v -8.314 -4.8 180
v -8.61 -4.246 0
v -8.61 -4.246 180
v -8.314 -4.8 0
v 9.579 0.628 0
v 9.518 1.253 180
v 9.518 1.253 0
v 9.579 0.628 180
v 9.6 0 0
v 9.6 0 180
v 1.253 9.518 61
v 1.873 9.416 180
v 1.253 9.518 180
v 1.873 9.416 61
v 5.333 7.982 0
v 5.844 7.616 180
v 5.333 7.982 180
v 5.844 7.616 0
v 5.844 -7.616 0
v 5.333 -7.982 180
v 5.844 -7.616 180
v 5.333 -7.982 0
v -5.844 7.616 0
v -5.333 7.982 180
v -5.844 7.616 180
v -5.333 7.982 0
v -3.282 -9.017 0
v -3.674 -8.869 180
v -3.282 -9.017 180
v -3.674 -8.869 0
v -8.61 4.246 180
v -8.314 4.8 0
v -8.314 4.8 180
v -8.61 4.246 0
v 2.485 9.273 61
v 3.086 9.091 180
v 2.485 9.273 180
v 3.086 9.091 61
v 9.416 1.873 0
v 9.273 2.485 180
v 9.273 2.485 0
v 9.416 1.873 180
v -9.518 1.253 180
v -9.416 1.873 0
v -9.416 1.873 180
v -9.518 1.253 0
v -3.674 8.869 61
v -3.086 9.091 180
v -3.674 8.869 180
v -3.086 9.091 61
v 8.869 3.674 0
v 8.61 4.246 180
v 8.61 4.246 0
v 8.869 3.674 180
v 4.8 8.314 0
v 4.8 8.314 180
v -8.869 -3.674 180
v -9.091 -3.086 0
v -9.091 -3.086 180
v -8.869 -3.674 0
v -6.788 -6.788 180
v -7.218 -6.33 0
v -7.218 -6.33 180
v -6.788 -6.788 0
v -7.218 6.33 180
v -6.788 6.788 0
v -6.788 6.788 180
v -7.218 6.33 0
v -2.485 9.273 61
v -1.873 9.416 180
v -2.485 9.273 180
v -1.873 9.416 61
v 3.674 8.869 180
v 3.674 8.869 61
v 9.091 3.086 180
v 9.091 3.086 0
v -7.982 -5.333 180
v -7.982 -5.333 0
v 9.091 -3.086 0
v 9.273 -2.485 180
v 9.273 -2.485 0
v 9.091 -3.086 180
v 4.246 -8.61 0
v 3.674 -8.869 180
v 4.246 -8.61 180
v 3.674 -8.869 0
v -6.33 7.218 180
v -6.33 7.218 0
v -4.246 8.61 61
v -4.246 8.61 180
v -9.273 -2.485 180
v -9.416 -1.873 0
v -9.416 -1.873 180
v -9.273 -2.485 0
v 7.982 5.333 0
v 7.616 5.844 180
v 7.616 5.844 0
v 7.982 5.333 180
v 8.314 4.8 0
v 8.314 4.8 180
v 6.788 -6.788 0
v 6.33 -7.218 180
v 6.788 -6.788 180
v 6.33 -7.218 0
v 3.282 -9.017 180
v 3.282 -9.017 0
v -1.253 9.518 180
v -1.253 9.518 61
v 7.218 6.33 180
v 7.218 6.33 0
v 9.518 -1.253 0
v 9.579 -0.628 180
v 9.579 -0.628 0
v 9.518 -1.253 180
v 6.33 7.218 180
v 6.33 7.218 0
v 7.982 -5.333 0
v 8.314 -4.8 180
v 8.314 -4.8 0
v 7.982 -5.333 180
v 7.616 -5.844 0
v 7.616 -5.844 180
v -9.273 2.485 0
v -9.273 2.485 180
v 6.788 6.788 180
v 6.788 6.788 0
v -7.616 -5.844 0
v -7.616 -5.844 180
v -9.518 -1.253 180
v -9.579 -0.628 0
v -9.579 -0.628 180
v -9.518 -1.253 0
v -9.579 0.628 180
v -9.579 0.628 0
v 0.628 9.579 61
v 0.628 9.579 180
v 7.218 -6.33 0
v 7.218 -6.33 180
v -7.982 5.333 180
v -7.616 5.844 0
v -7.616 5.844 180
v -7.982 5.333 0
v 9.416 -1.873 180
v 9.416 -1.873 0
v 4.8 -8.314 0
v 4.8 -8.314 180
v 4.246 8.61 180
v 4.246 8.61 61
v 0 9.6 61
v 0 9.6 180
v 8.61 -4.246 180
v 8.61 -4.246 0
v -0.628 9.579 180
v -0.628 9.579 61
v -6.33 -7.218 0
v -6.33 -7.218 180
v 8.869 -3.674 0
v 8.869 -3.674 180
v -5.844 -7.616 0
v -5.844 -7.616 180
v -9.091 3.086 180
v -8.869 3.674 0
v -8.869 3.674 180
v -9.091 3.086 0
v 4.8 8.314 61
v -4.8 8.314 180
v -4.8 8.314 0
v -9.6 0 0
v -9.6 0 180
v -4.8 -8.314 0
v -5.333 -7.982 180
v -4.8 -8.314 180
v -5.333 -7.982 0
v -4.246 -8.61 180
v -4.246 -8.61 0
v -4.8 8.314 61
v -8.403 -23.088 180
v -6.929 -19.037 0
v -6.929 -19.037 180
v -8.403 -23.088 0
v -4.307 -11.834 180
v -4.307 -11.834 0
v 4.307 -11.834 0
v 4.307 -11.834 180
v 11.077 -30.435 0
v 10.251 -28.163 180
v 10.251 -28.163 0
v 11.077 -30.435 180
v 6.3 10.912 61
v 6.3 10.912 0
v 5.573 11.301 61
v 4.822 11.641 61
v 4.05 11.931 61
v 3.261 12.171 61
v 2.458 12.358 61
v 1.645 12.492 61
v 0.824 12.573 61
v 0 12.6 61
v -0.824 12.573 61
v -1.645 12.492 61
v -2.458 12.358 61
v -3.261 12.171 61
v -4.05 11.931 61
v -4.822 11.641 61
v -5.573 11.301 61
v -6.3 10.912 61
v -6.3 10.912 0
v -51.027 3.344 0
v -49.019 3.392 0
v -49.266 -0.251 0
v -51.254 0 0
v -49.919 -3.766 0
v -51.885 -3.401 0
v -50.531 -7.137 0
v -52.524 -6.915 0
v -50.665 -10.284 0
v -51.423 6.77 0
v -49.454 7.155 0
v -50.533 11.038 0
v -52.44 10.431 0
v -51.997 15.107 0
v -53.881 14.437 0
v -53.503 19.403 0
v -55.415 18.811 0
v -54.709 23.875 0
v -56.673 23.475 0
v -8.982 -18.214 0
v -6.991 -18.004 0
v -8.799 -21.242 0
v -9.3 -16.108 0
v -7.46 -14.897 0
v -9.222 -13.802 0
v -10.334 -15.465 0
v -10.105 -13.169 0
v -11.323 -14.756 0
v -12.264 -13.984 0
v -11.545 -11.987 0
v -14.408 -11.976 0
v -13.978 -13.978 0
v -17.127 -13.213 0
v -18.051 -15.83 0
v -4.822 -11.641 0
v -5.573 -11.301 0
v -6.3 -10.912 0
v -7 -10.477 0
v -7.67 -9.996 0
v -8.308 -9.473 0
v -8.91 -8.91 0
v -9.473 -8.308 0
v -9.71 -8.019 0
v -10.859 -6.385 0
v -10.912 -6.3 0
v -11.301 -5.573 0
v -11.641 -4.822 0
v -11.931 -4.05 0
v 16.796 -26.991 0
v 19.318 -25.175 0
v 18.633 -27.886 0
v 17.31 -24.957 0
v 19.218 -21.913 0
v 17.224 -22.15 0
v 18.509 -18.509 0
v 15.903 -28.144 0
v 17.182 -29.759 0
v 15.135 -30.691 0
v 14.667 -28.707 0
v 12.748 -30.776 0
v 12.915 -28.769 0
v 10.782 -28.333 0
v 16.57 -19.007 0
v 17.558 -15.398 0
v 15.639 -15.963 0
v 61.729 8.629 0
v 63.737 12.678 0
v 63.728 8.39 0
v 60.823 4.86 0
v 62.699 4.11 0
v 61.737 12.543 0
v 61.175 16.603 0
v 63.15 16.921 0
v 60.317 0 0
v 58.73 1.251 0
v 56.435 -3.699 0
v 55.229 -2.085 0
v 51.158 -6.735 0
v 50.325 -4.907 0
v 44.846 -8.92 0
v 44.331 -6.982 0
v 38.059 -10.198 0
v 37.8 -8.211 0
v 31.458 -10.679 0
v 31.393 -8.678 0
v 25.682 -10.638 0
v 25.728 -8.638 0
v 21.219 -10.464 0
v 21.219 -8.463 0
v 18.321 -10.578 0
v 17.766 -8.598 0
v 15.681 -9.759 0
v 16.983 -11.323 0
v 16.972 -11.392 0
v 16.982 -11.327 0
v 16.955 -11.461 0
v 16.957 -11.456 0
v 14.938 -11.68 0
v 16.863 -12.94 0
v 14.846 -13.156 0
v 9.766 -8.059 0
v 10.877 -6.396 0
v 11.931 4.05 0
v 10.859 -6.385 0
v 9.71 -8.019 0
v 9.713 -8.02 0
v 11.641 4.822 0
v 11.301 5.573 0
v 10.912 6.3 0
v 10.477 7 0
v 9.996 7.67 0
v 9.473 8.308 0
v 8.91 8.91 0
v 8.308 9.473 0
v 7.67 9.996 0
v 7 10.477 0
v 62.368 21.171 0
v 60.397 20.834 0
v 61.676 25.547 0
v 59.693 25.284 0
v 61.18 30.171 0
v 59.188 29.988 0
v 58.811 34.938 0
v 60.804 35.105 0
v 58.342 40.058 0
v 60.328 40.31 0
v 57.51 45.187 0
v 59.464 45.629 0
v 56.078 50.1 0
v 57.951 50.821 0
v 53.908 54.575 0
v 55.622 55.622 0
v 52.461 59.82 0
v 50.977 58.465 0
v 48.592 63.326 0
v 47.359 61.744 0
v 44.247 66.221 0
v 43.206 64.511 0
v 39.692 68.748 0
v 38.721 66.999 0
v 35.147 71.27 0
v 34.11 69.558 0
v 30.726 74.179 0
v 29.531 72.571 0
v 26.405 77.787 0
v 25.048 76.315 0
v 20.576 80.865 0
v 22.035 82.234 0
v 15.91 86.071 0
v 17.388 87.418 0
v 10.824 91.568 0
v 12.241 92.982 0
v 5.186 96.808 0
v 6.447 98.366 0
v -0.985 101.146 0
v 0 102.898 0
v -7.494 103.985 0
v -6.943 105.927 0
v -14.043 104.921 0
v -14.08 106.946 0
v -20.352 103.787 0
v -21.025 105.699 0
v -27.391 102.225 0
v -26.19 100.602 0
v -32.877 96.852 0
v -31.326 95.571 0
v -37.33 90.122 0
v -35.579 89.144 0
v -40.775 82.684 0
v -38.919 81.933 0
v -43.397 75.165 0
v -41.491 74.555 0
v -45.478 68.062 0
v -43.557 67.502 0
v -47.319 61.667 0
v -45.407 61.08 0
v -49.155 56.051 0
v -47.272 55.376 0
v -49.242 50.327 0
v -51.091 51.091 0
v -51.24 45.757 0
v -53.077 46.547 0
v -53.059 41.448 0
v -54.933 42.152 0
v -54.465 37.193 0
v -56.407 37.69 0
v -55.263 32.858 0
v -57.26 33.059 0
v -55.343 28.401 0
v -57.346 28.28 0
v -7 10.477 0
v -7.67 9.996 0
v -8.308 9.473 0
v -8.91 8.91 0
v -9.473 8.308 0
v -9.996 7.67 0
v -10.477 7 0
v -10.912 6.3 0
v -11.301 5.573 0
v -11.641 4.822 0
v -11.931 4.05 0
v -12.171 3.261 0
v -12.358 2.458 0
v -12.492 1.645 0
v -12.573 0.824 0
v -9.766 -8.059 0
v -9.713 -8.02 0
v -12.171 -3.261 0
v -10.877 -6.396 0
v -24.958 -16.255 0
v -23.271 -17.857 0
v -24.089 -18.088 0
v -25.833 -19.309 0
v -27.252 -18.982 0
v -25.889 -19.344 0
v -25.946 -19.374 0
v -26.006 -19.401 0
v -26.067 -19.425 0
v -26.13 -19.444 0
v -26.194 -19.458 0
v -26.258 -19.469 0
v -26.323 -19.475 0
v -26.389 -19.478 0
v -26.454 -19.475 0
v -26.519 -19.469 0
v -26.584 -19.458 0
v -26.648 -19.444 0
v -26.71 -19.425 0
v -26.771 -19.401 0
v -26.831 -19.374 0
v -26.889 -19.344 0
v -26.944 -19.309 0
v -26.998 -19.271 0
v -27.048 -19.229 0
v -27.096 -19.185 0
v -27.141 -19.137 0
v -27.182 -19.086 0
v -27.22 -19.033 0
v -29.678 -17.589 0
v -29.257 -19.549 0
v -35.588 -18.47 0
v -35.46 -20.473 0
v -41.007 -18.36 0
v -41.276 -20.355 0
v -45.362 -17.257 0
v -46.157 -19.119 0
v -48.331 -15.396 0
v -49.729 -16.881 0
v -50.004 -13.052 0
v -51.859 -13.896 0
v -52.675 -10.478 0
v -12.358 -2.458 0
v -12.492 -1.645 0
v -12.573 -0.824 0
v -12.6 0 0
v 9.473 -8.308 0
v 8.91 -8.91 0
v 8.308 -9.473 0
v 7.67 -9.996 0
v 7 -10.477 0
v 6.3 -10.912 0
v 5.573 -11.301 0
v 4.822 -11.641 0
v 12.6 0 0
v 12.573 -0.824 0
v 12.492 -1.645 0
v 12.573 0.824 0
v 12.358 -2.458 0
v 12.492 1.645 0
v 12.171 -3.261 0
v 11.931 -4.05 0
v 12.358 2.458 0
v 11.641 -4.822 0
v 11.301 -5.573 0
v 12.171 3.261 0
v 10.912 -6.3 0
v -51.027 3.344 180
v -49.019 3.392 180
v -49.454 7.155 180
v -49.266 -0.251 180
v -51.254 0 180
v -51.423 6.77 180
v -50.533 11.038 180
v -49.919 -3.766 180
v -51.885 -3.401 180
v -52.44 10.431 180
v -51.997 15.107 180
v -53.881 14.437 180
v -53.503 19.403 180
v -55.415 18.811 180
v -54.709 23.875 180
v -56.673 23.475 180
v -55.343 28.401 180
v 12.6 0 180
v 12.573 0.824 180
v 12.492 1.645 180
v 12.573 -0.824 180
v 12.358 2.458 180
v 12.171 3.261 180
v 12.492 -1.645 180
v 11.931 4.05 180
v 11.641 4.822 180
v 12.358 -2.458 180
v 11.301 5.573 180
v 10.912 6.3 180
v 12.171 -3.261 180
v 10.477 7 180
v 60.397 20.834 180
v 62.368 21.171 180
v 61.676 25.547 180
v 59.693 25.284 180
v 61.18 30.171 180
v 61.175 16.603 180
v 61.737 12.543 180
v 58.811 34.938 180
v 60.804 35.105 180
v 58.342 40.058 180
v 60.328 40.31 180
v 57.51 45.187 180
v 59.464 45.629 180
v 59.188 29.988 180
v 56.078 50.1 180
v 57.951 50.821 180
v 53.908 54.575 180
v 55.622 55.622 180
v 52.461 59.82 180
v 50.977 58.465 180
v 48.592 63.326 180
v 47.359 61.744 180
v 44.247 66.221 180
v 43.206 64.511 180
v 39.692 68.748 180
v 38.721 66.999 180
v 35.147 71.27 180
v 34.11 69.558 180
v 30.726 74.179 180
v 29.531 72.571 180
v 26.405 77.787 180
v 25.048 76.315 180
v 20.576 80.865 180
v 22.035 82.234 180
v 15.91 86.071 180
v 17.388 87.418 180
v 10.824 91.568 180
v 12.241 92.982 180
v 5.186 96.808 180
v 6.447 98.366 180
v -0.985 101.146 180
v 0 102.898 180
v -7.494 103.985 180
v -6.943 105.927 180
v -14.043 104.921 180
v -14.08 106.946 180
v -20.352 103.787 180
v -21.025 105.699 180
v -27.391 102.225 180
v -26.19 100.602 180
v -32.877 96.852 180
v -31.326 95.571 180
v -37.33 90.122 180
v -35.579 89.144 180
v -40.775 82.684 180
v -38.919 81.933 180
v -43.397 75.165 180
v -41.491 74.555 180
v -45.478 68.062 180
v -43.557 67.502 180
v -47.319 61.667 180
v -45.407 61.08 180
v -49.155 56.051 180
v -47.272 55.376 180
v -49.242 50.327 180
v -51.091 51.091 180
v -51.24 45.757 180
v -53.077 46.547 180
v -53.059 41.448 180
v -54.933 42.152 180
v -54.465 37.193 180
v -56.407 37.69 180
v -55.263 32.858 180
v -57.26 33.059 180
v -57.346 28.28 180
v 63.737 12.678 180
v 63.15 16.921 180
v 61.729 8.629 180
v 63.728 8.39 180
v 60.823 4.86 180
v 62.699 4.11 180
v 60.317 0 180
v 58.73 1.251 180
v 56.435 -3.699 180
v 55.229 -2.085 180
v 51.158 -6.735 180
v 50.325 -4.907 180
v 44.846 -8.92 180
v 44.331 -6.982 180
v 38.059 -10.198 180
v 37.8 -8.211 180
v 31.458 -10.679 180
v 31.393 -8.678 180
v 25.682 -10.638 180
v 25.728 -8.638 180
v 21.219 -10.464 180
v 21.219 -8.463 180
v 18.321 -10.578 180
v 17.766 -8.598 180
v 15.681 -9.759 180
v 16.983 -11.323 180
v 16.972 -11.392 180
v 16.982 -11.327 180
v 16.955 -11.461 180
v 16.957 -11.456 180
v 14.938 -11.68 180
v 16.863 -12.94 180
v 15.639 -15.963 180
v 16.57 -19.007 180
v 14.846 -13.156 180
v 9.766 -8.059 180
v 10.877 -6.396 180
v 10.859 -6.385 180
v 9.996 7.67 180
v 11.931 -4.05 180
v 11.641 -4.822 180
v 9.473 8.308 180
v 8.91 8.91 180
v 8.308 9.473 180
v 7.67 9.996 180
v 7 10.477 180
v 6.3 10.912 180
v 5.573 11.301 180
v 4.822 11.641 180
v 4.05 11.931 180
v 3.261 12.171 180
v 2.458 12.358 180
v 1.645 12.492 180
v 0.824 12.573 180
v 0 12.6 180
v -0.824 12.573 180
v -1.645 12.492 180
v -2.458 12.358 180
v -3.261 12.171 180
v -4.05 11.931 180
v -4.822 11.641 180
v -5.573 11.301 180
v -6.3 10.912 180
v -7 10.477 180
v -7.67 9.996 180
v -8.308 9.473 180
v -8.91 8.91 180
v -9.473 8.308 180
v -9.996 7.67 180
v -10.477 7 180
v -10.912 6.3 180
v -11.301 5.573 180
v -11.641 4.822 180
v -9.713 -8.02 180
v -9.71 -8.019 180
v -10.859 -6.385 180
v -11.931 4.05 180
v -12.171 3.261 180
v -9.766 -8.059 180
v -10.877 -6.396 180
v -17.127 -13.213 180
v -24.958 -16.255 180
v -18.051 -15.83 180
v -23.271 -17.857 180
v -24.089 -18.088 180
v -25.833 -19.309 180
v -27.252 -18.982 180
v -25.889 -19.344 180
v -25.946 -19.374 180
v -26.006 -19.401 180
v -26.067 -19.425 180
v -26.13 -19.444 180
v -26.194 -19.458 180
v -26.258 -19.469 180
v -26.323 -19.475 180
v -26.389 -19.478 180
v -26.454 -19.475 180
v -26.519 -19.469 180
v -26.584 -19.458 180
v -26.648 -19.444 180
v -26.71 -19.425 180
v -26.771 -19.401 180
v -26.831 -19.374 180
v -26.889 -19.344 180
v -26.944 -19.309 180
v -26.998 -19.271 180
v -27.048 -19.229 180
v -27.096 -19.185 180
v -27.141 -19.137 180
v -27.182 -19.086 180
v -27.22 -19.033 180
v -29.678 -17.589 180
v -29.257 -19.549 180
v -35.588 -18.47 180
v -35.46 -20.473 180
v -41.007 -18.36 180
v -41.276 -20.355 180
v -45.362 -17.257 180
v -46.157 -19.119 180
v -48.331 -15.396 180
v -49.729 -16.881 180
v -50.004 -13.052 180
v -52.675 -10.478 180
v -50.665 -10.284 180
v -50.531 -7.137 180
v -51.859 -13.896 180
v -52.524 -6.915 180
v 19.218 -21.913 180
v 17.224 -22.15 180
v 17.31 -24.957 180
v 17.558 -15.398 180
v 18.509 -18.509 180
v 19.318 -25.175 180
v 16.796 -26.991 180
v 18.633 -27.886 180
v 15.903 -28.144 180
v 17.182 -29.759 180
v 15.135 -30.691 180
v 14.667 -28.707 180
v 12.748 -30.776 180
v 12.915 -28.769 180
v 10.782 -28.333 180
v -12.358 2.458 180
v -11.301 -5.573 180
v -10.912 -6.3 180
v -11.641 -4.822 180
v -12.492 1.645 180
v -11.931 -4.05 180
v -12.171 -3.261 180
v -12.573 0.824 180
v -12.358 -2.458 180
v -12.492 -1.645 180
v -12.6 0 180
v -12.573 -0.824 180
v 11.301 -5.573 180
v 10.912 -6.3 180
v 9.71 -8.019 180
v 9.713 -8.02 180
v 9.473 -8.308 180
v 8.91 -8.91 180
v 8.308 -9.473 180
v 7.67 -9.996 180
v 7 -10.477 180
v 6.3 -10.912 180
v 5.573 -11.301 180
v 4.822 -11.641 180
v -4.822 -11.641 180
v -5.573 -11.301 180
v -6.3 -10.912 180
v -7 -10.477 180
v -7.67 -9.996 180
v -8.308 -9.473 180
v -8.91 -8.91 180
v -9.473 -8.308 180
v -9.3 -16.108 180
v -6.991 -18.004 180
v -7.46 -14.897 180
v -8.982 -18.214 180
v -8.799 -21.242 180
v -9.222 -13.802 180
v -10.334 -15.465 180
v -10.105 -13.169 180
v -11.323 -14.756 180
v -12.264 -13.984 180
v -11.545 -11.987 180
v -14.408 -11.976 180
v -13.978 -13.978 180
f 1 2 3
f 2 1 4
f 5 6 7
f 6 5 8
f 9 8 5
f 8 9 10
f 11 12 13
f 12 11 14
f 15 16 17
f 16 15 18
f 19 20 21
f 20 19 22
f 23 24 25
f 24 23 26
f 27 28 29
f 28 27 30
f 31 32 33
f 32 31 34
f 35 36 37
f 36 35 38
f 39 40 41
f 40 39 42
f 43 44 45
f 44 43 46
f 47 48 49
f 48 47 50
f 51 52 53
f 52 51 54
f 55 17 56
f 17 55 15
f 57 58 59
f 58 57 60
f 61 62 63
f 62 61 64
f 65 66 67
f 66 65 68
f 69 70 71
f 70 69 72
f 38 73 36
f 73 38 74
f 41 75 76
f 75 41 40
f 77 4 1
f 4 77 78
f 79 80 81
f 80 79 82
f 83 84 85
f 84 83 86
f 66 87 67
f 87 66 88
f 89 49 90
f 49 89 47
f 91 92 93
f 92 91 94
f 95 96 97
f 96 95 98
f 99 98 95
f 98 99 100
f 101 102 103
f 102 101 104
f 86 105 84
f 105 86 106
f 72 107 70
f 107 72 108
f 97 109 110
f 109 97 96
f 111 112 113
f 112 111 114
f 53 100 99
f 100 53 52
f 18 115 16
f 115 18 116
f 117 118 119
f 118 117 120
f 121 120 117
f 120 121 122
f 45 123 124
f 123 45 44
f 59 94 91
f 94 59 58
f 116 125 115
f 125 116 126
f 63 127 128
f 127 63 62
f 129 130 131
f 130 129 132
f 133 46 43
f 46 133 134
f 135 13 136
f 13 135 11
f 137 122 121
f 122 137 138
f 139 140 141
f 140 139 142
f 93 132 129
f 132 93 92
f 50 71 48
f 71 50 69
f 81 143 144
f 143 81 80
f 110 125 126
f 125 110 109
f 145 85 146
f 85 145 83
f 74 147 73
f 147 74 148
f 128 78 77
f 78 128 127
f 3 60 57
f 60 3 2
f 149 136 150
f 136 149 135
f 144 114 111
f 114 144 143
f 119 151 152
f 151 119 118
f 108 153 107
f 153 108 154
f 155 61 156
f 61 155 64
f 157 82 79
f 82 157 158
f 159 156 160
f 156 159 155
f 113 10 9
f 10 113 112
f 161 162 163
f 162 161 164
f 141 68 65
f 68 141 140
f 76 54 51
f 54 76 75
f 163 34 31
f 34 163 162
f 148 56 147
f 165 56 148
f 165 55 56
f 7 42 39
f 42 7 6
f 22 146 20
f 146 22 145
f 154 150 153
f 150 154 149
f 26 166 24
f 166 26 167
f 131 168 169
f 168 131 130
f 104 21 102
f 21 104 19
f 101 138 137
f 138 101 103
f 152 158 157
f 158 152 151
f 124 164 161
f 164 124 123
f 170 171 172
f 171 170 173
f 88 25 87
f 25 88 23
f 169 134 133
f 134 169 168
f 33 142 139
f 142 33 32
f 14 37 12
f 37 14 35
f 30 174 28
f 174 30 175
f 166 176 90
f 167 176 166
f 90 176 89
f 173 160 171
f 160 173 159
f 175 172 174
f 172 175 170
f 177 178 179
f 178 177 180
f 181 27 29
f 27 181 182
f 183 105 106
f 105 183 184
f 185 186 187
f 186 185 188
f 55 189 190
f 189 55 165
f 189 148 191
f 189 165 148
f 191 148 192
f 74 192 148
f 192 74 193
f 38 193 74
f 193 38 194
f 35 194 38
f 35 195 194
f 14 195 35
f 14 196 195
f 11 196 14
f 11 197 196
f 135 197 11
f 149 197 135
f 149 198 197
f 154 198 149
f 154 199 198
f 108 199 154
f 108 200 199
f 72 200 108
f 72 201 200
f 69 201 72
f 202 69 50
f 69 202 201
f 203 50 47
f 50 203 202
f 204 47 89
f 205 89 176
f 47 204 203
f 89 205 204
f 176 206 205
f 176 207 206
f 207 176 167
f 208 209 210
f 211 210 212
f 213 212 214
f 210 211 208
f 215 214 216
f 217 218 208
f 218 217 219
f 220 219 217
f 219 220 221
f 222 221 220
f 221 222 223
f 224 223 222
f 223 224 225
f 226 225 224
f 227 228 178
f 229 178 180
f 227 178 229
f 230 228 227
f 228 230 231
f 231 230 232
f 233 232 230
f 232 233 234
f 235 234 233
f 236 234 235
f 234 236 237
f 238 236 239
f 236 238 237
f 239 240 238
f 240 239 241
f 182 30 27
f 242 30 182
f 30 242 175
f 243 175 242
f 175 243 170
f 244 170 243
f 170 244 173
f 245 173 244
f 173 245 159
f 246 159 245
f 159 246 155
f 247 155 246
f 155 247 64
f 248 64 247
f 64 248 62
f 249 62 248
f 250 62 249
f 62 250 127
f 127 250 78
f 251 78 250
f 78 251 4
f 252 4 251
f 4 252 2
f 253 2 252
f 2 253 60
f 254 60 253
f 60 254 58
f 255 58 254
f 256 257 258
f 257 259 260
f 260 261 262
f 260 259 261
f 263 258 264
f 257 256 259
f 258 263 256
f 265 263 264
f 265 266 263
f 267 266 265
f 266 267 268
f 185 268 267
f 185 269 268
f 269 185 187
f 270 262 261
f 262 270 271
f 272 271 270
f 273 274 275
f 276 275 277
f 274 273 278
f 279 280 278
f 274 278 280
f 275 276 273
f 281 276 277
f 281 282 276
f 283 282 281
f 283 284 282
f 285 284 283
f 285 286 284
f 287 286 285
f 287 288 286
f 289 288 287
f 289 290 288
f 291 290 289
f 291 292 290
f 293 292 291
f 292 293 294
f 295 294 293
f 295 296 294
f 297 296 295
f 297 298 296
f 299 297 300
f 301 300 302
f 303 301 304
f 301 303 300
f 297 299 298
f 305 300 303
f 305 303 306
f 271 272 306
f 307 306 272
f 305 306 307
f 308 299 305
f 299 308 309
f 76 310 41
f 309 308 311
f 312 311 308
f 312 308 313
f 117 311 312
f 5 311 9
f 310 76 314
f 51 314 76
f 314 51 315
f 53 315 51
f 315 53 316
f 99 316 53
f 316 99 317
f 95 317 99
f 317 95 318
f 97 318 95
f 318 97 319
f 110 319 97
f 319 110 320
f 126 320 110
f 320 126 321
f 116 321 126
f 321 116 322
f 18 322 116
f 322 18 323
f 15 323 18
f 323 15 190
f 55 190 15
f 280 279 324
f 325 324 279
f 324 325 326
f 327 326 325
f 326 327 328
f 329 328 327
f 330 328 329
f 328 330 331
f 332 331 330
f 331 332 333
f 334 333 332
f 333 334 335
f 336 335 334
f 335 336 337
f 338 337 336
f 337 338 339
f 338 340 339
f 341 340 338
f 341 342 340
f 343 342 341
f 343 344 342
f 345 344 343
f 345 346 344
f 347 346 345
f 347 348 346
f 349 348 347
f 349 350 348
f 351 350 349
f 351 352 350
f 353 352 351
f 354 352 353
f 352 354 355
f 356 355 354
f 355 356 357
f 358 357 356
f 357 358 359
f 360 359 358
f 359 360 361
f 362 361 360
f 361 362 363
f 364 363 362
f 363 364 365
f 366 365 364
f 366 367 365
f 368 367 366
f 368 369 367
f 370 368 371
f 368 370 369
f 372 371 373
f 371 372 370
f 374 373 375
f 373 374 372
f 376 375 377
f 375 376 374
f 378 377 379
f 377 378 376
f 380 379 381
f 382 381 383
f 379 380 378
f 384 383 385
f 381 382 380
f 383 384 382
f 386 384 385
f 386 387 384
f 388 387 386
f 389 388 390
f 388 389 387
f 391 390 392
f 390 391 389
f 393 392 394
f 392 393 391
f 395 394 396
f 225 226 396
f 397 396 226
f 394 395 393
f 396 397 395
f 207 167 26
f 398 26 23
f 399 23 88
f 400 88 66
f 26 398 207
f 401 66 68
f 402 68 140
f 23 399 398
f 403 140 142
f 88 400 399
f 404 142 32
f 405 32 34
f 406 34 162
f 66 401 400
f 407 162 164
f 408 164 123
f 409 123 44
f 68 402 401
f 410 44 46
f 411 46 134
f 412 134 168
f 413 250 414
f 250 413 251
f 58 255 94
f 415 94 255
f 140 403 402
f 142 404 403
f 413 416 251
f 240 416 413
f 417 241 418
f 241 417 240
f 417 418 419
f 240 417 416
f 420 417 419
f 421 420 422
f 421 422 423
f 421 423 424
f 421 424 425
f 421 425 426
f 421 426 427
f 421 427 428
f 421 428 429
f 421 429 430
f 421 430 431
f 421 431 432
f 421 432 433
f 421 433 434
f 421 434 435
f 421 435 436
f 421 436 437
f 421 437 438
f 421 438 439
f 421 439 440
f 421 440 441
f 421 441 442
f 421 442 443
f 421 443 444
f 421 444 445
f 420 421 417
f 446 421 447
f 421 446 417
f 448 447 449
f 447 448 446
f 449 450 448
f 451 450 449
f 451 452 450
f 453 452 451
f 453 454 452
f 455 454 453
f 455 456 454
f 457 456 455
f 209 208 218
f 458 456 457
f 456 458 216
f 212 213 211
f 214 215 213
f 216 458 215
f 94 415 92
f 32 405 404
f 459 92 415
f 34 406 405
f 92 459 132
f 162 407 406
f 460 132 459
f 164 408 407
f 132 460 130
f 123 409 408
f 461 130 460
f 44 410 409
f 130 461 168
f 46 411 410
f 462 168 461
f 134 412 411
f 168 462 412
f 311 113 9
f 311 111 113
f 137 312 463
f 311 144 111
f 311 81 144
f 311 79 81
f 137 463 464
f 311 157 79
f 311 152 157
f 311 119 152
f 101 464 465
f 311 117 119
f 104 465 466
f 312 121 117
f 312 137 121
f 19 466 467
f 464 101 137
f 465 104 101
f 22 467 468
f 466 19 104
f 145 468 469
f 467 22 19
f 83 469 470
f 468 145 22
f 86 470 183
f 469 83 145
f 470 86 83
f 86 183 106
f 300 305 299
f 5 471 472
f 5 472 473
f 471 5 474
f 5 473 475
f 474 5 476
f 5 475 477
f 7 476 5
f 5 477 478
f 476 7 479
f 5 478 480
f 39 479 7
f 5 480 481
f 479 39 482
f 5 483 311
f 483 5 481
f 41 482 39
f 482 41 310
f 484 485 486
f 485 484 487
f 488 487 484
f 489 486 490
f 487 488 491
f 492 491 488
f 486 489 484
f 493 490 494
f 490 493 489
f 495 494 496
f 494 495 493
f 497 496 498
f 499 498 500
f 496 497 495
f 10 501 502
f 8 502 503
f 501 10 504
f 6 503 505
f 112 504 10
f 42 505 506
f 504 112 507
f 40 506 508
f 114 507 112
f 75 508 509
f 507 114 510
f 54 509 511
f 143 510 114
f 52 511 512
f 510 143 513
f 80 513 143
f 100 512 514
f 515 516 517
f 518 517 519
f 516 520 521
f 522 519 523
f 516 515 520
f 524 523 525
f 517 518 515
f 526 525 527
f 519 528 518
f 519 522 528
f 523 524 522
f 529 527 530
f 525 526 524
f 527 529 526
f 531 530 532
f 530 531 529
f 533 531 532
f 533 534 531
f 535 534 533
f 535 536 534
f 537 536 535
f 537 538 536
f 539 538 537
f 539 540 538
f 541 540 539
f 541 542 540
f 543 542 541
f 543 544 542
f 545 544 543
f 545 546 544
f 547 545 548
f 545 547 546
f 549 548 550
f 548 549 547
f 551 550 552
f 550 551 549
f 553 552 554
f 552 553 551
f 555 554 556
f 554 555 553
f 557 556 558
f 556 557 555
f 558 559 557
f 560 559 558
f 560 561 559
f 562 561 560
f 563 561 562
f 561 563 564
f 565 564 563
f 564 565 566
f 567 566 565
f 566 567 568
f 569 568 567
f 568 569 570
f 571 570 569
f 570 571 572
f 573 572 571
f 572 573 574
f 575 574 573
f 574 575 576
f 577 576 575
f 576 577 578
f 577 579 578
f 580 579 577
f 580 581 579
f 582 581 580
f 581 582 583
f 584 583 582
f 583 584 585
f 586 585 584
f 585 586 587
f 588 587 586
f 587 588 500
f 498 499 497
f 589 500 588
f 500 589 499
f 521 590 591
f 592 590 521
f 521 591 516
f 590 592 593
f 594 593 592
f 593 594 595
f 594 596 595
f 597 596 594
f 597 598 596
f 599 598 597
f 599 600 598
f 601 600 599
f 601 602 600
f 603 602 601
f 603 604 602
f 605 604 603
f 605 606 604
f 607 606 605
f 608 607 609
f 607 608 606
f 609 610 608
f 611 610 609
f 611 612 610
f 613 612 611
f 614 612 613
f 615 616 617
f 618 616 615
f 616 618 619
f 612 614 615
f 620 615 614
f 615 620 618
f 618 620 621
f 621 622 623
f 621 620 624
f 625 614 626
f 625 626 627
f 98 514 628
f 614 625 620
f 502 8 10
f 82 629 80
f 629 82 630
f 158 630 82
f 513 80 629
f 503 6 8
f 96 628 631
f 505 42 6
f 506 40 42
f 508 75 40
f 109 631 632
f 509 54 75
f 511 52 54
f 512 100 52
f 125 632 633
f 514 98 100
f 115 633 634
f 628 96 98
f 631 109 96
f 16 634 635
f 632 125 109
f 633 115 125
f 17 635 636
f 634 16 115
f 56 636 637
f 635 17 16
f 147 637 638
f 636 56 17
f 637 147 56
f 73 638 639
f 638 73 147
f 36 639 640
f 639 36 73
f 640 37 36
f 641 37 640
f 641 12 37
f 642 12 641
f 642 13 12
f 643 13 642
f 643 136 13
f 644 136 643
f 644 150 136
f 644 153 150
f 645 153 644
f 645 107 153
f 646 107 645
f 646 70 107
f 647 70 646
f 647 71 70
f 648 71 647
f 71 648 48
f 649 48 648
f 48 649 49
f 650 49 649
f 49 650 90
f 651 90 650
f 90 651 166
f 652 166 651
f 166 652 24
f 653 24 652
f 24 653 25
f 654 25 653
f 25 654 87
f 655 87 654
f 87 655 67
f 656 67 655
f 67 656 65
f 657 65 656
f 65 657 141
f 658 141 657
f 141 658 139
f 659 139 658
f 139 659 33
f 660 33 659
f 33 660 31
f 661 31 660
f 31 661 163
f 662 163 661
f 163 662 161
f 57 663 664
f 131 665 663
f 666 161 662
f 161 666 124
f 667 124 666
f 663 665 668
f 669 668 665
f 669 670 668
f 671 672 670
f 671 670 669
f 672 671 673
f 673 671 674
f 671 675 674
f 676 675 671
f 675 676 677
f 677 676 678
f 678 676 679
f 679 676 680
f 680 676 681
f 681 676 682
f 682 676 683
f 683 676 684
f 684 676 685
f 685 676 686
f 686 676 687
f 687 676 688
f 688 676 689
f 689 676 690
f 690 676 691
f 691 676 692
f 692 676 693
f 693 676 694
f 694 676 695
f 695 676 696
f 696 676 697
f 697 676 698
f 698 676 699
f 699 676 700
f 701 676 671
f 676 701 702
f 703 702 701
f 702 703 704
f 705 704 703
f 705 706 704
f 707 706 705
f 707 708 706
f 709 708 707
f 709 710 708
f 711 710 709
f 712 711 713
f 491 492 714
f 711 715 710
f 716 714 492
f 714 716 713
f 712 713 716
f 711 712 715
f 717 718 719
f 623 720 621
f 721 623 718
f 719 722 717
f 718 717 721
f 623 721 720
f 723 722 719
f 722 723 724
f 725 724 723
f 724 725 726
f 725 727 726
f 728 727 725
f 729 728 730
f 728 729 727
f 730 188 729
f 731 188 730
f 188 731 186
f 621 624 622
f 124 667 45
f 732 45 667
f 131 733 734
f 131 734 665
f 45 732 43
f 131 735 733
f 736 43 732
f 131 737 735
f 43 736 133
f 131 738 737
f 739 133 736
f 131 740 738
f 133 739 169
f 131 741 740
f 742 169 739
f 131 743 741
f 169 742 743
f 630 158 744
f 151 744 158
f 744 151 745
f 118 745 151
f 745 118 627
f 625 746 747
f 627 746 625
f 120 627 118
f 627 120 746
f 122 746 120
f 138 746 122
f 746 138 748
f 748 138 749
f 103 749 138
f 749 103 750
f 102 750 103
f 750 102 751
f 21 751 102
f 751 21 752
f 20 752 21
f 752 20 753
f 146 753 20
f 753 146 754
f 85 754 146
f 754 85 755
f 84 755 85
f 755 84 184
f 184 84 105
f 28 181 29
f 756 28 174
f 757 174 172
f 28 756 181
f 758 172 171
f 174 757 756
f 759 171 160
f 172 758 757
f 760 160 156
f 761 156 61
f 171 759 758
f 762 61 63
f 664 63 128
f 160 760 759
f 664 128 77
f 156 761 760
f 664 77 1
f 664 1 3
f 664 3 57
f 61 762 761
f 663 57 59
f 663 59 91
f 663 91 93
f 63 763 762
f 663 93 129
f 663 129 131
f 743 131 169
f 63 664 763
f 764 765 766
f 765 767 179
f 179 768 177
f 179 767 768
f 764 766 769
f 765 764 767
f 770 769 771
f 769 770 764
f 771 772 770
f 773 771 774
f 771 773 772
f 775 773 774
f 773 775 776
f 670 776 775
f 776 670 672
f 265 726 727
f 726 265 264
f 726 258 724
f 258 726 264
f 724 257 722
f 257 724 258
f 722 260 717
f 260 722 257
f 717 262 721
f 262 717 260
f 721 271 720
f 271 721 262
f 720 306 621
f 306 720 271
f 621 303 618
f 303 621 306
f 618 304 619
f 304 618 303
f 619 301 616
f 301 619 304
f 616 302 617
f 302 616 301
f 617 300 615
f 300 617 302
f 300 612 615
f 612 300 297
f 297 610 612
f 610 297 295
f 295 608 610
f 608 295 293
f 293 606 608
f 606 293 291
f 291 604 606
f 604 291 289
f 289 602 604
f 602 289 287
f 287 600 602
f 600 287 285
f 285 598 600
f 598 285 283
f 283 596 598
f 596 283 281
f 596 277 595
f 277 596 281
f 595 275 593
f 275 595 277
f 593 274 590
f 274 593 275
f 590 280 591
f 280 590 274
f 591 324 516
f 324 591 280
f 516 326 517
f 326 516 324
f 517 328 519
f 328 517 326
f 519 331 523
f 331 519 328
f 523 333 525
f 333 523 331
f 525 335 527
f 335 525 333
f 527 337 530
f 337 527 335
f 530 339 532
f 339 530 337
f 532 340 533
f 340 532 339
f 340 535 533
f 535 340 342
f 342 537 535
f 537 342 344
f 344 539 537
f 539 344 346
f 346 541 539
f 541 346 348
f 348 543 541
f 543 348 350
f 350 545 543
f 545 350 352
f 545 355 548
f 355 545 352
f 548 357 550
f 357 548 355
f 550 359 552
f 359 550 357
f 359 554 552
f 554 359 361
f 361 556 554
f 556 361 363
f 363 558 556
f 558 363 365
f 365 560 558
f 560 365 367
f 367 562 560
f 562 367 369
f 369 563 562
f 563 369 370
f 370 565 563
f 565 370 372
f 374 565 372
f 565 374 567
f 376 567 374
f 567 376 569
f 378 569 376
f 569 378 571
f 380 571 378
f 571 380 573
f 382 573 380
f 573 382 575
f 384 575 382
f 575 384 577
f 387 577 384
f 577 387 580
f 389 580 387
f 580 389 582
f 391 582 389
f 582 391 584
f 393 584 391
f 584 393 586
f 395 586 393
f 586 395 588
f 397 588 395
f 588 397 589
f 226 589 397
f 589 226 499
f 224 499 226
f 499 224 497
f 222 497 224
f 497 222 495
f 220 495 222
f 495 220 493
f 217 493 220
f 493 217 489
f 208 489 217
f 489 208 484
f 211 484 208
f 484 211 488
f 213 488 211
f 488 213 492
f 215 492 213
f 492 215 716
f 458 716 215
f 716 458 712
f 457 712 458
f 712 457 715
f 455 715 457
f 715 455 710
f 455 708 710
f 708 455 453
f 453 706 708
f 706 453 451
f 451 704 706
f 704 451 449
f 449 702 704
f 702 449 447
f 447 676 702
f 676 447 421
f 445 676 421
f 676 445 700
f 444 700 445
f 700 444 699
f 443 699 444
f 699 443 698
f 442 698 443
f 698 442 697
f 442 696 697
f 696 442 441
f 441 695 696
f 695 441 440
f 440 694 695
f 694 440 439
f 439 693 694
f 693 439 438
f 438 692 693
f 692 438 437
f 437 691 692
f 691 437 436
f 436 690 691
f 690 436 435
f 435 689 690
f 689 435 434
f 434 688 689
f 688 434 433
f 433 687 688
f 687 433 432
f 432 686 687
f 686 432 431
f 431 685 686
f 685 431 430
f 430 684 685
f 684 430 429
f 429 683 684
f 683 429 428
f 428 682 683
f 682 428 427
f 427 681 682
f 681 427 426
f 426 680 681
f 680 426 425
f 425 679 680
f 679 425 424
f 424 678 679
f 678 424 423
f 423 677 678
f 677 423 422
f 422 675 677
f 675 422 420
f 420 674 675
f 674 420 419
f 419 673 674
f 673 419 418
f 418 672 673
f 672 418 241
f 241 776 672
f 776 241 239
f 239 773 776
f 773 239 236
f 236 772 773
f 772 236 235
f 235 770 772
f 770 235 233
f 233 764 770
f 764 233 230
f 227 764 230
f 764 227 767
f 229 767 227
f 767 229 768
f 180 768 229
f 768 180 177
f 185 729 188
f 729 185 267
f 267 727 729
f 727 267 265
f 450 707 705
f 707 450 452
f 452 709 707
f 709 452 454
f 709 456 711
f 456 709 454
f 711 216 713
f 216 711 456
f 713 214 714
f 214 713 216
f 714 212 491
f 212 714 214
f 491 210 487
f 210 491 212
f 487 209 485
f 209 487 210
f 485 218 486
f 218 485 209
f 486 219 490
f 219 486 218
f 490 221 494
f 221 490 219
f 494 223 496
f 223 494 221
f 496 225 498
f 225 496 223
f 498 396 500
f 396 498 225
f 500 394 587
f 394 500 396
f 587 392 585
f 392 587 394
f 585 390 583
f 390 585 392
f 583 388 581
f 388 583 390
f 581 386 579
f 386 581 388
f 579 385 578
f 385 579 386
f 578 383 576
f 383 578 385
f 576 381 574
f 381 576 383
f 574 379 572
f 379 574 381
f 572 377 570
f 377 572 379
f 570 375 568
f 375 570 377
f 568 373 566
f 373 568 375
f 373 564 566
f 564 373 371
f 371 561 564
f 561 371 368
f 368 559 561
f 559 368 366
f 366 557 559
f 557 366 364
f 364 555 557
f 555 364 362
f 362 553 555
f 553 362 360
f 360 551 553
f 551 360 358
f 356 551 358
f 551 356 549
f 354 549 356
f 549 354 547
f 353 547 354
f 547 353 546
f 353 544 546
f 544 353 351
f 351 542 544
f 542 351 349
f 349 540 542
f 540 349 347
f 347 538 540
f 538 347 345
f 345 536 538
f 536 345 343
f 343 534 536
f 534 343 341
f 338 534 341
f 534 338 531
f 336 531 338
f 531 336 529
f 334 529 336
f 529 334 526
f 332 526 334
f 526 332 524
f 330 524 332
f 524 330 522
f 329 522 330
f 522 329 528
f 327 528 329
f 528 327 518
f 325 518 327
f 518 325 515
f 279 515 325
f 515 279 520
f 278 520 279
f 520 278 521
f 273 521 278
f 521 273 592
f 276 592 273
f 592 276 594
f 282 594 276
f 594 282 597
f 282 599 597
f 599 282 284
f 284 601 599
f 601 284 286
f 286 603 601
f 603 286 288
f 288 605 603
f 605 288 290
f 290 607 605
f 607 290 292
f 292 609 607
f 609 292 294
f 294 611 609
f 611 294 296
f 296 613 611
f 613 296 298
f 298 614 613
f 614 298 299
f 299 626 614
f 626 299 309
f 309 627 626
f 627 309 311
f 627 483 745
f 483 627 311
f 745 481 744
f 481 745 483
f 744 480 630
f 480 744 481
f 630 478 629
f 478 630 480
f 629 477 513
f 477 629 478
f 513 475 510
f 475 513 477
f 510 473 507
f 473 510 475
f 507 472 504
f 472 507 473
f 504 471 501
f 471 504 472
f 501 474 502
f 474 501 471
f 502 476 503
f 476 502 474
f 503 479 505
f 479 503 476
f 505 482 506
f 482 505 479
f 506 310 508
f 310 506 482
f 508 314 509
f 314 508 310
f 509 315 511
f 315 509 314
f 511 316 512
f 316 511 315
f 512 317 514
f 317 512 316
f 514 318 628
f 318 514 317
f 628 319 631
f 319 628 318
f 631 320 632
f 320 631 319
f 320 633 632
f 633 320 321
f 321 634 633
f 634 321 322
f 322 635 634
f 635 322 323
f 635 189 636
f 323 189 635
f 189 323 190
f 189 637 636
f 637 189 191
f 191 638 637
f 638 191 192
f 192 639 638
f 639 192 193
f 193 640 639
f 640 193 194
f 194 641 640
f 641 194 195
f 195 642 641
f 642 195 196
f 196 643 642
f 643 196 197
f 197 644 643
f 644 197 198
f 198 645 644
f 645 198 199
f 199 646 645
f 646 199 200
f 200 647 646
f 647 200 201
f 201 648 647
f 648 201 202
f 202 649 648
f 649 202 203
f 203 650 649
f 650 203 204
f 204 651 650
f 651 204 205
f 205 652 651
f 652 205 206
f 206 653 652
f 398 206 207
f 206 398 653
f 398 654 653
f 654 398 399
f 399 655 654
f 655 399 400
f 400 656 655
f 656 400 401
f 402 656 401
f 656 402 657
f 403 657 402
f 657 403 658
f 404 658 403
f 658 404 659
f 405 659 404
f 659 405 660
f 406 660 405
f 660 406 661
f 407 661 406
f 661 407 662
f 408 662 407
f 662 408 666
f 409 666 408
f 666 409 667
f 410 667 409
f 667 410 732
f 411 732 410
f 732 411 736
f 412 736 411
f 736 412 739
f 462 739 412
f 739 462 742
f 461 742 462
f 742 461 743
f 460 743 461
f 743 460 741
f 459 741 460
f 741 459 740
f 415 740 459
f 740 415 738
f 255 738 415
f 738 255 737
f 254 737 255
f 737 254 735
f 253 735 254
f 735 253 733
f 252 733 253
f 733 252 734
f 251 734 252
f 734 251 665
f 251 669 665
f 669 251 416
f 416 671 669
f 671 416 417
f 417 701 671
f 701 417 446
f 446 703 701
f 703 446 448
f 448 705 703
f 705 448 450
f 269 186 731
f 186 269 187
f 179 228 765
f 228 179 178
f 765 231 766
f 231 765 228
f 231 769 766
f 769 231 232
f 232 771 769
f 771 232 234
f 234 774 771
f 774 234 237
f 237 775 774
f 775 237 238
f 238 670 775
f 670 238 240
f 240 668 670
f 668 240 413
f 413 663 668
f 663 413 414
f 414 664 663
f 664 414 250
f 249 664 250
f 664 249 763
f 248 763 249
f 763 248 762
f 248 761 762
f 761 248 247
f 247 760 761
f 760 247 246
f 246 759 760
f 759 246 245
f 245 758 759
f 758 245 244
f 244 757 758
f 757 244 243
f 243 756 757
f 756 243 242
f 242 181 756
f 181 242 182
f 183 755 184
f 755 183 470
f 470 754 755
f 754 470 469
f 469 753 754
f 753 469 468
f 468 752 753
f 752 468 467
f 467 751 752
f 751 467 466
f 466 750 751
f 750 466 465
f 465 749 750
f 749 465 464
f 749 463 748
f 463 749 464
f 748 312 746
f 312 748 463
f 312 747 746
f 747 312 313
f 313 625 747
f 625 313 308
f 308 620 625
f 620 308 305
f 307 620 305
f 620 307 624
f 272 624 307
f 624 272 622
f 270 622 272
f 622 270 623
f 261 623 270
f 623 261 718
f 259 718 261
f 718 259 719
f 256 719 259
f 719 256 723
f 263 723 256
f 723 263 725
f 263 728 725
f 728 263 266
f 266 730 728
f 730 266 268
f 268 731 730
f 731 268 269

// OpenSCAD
// Lampenschirm für Stehlampe – organischer, wellenförmiger Querschnitt
// mit Klemmkragen, der in die Form integriert ist (keine D-Form mehr)
// Alle Maße in Millimetern (Regel: units-mm)
//
// Kontext: context/printer.md, context/tolerances.md und context/materials.md
// waren zum Zeitpunkt der Modellierung leer (siehe Regel: context-first).
// Annahmen aus dem Design-Dialog (siehe auch 001/002):
//   - Baubett >= 200mm Z-Höhe vorhanden -> Schirm wird als ein Teil,
//     stehend, in voller Höhe gedruckt.
//   - Klemmkragen als offener Federclip (C-Ring): Innendurchmesser 0.8mm
//     unter Stangendurchmesser (19.2mm ID auf 20mm Stange) für Vorspannung.
//   - E14-Fassung wird separat an der Stange montiert.
//
// Änderungen gegenüber 005 (Nutzer-Feedback: "Verbindung zwischen Klemme und
// Wand sieht wulstig/hässlich aus, soll dieselbe Wandstärke wie sonst haben"):
//   - Der massive Verbindungskeil (boss_bridge_2d, voller Sektor von 140°) ist
//     ersetzt durch zwei schlanke Stege (bridge_ribs_2d), jeweils exakt
//     wall_t (2mm) dick - gebaut über hull() von zwei Kreisen (Kapsel-Technik),
//     dadurch garantiert konstante Wandstärke unabhängig von der Wellenform.
//   - Die Stege sitzen bei ±55° neben dem Montagespalt (Winkel 215°/325°,
//     Spalt selbst bleibt bei 250°-290° frei) und verbinden den Klemmkragen
//     direkt mit der Innenseite der normalen Schirmwand an der jeweiligen
//     Stelle.

// ---- Parameter ----
shade_height = 180;   // Gesamthöhe des Schirms
wall_t       = 2;     // Wandstärke Schirm (dünn für Lichtdurchlässigkeit) - gilt jetzt auch für die Klemm-Stege

rod_d      = 20;                 // Durchmesser der Metallstange
rod_r      = rod_d / 2;
clip_id    = 19.2;               // Innendurchmesser Klemmkragen (Vorspannung, ~0.8mm Untermaß)
clip_r_in  = clip_id / 2;
clip_wall  = 3;                  // Wandstärke Klemmkragen (dicker als Schirmwand, für Klemmkraft)
clip_r_out = clip_r_in + clip_wall;
clip_gap_deg = 40;               // Öffnungswinkel des C-Rings (Montagespalt, zeigt nach -Y)

socket_slot_deg    = 60;              // Öffnungswinkel des Fassungs-Schlitzes (Innenseite, +Y) - Annahme
socket_slot_height = shade_height / 3; // unteres Drittel der Klemme ist auf der Innenseite offen

// Organische Grundform (Fourier-Basis, Radius in mm ab Stangenmitte):
// front (θ=90°, +Y) ≈ 95mm, Seiten (θ=0°/180°) ≈ 50mm, Rückseite (θ=270°, -Y) ≈ 25mm
base_a0 = 55;
base_a1 = 35;
base_a2 = 5;

// Wellen-Überlagerung für den organischen/wellenförmigen Look
wave_amp1 = 9;   wave_freq1 = 4;  wave_phase1 = 40;
wave_amp2 = 5;   wave_freq2 = 7;  wave_phase2 = 115;

min_r = clip_r_out + 6;          // harte Untergrenze: Kontur darf den Klemmkragen nie schneiden
cut_far = 300;                   // "unendlich" großer Radius für Schnitte, die garantiert bis nach außen durchbrechen sollen

rib_angles = [215, 325];         // Winkel der Verbindungsstege (neben dem Montagespalt bei 250°-290°)

$fn = 96;

// Radius der organischen Kontur in Abhängigkeit vom Winkel θ (Grad)
function organic_r(theta) =
    let(phi = theta - 90)
    let(base = base_a0 + base_a1 * cos(phi) + base_a2 * cos(2 * phi))
    let(wave = wave_amp1 * sin(wave_freq1 * theta + wave_phase1)
             + wave_amp2 * sin(wave_freq2 * theta + wave_phase2))
    max(base + wave, min_r);

// Geschlossenes 2D-Profil der organischen Außenkontur
module organic_outline() {
    step = 360 / $fn;
    polygon(points = [
        for (t = [0 : step : 360 - step])
            [organic_r(t) * cos(t), organic_r(t) * sin(t)]
    ]);
}

// Keilförmiger 2D-Ausschnitt, zentriert auf Winkel 0
module pie_wedge_2d(radius, angle_deg) {
    a = angle_deg / 2;
    polygon(points = [
        [0, 0],
        [radius * cos(a), radius * sin(a)],
        [radius * cos(-a), radius * sin(-a)]
    ]);
}

// Ein schlanker Verbindungssteg (konstante Breite wall_t) vom Klemmkragen
// (r=clip_r_out) radial nach außen bis zur Innenseite der Schirmwand, an
// einem festen Winkel. hull() zweier Kreise ergibt eine "Kapsel" mit exakt
// konstanter Breite - unabhängig von offset()/Wellenform.
module rib_2d(angle_deg) {
    r_outer = organic_r(angle_deg) - wall_t / 2;
    p1 = [clip_r_out * cos(angle_deg), clip_r_out * sin(angle_deg)];
    p2 = [r_outer * cos(angle_deg), r_outer * sin(angle_deg)];
    hull() {
        translate(p1) circle(r = wall_t / 2);
        translate(p2) circle(r = wall_t / 2);
    }
}

module bridge_ribs_2d() {
    union()
        for (a = rib_angles)
            rib_2d(a);
}

// Voller Klemmkragen-Rohling (Bohrung/Spalt werden erst in 3D herausgeschnitten)
module collar_disk_2d() {
    circle(r = clip_r_out);
}

// 2D-Profil der Wand: normale 2mm-Schale überall + Klemmkragen-Rohling +
// zwei schlanke 2mm-Stege, die den Kragen mit der Wand verbinden
module shell_with_boss_2d() {
    union() {
        difference() {
            organic_outline();
            offset(delta = -wall_t)
                organic_outline();
        }
        collar_disk_2d();
        bridge_ribs_2d();
    }
}

module organic_shell() {
    linear_extrude(height = shade_height)
        shell_with_boss_2d();
}

// Radialer Schlitz von z0 bis z1, in Richtung facing_deg ausgerichtet
module radial_slot(radius, angle_deg, facing_deg, z0, z1) {
    translate([0, 0, z0])
        rotate([0, 0, facing_deg])
            linear_extrude(z1 - z0)
                pie_wedge_2d(radius, angle_deg);
}

// Alle Ausschnitte für die Klemme: durchgehende Stangenbohrung + Montagespalt
// (volle Höhe, -Y, bricht bis zur echten Außenwand durch, damit seitlich
// eingeclipst werden kann) + Fassungs-Schlitz (unteres Drittel, +Y, öffnet
// nur bis in den ohnehin dort schon hohlen Innenraum)
module clamp_cutouts() {
    union() {
        translate([0, 0, -1])
            cylinder(r = clip_r_in, h = shade_height + 2);

        radial_slot(cut_far, clip_gap_deg, 270, -1, shade_height + 1);

        radial_slot(clip_r_out + 5, socket_slot_deg, 90, -1, socket_slot_height + 1);
    }
}

// render() erzwingt die vollständige (exakte) Boolesche Berechnung statt der
// schnellen OpenCSG-Live-Vorschau, damit die Klemme auch in der OpenSCAD-
// Vorschau (F5) korrekt dargestellt wird.
render(convexity = 10)
    difference() {
        organic_shell();
        clamp_cutouts();
    }
